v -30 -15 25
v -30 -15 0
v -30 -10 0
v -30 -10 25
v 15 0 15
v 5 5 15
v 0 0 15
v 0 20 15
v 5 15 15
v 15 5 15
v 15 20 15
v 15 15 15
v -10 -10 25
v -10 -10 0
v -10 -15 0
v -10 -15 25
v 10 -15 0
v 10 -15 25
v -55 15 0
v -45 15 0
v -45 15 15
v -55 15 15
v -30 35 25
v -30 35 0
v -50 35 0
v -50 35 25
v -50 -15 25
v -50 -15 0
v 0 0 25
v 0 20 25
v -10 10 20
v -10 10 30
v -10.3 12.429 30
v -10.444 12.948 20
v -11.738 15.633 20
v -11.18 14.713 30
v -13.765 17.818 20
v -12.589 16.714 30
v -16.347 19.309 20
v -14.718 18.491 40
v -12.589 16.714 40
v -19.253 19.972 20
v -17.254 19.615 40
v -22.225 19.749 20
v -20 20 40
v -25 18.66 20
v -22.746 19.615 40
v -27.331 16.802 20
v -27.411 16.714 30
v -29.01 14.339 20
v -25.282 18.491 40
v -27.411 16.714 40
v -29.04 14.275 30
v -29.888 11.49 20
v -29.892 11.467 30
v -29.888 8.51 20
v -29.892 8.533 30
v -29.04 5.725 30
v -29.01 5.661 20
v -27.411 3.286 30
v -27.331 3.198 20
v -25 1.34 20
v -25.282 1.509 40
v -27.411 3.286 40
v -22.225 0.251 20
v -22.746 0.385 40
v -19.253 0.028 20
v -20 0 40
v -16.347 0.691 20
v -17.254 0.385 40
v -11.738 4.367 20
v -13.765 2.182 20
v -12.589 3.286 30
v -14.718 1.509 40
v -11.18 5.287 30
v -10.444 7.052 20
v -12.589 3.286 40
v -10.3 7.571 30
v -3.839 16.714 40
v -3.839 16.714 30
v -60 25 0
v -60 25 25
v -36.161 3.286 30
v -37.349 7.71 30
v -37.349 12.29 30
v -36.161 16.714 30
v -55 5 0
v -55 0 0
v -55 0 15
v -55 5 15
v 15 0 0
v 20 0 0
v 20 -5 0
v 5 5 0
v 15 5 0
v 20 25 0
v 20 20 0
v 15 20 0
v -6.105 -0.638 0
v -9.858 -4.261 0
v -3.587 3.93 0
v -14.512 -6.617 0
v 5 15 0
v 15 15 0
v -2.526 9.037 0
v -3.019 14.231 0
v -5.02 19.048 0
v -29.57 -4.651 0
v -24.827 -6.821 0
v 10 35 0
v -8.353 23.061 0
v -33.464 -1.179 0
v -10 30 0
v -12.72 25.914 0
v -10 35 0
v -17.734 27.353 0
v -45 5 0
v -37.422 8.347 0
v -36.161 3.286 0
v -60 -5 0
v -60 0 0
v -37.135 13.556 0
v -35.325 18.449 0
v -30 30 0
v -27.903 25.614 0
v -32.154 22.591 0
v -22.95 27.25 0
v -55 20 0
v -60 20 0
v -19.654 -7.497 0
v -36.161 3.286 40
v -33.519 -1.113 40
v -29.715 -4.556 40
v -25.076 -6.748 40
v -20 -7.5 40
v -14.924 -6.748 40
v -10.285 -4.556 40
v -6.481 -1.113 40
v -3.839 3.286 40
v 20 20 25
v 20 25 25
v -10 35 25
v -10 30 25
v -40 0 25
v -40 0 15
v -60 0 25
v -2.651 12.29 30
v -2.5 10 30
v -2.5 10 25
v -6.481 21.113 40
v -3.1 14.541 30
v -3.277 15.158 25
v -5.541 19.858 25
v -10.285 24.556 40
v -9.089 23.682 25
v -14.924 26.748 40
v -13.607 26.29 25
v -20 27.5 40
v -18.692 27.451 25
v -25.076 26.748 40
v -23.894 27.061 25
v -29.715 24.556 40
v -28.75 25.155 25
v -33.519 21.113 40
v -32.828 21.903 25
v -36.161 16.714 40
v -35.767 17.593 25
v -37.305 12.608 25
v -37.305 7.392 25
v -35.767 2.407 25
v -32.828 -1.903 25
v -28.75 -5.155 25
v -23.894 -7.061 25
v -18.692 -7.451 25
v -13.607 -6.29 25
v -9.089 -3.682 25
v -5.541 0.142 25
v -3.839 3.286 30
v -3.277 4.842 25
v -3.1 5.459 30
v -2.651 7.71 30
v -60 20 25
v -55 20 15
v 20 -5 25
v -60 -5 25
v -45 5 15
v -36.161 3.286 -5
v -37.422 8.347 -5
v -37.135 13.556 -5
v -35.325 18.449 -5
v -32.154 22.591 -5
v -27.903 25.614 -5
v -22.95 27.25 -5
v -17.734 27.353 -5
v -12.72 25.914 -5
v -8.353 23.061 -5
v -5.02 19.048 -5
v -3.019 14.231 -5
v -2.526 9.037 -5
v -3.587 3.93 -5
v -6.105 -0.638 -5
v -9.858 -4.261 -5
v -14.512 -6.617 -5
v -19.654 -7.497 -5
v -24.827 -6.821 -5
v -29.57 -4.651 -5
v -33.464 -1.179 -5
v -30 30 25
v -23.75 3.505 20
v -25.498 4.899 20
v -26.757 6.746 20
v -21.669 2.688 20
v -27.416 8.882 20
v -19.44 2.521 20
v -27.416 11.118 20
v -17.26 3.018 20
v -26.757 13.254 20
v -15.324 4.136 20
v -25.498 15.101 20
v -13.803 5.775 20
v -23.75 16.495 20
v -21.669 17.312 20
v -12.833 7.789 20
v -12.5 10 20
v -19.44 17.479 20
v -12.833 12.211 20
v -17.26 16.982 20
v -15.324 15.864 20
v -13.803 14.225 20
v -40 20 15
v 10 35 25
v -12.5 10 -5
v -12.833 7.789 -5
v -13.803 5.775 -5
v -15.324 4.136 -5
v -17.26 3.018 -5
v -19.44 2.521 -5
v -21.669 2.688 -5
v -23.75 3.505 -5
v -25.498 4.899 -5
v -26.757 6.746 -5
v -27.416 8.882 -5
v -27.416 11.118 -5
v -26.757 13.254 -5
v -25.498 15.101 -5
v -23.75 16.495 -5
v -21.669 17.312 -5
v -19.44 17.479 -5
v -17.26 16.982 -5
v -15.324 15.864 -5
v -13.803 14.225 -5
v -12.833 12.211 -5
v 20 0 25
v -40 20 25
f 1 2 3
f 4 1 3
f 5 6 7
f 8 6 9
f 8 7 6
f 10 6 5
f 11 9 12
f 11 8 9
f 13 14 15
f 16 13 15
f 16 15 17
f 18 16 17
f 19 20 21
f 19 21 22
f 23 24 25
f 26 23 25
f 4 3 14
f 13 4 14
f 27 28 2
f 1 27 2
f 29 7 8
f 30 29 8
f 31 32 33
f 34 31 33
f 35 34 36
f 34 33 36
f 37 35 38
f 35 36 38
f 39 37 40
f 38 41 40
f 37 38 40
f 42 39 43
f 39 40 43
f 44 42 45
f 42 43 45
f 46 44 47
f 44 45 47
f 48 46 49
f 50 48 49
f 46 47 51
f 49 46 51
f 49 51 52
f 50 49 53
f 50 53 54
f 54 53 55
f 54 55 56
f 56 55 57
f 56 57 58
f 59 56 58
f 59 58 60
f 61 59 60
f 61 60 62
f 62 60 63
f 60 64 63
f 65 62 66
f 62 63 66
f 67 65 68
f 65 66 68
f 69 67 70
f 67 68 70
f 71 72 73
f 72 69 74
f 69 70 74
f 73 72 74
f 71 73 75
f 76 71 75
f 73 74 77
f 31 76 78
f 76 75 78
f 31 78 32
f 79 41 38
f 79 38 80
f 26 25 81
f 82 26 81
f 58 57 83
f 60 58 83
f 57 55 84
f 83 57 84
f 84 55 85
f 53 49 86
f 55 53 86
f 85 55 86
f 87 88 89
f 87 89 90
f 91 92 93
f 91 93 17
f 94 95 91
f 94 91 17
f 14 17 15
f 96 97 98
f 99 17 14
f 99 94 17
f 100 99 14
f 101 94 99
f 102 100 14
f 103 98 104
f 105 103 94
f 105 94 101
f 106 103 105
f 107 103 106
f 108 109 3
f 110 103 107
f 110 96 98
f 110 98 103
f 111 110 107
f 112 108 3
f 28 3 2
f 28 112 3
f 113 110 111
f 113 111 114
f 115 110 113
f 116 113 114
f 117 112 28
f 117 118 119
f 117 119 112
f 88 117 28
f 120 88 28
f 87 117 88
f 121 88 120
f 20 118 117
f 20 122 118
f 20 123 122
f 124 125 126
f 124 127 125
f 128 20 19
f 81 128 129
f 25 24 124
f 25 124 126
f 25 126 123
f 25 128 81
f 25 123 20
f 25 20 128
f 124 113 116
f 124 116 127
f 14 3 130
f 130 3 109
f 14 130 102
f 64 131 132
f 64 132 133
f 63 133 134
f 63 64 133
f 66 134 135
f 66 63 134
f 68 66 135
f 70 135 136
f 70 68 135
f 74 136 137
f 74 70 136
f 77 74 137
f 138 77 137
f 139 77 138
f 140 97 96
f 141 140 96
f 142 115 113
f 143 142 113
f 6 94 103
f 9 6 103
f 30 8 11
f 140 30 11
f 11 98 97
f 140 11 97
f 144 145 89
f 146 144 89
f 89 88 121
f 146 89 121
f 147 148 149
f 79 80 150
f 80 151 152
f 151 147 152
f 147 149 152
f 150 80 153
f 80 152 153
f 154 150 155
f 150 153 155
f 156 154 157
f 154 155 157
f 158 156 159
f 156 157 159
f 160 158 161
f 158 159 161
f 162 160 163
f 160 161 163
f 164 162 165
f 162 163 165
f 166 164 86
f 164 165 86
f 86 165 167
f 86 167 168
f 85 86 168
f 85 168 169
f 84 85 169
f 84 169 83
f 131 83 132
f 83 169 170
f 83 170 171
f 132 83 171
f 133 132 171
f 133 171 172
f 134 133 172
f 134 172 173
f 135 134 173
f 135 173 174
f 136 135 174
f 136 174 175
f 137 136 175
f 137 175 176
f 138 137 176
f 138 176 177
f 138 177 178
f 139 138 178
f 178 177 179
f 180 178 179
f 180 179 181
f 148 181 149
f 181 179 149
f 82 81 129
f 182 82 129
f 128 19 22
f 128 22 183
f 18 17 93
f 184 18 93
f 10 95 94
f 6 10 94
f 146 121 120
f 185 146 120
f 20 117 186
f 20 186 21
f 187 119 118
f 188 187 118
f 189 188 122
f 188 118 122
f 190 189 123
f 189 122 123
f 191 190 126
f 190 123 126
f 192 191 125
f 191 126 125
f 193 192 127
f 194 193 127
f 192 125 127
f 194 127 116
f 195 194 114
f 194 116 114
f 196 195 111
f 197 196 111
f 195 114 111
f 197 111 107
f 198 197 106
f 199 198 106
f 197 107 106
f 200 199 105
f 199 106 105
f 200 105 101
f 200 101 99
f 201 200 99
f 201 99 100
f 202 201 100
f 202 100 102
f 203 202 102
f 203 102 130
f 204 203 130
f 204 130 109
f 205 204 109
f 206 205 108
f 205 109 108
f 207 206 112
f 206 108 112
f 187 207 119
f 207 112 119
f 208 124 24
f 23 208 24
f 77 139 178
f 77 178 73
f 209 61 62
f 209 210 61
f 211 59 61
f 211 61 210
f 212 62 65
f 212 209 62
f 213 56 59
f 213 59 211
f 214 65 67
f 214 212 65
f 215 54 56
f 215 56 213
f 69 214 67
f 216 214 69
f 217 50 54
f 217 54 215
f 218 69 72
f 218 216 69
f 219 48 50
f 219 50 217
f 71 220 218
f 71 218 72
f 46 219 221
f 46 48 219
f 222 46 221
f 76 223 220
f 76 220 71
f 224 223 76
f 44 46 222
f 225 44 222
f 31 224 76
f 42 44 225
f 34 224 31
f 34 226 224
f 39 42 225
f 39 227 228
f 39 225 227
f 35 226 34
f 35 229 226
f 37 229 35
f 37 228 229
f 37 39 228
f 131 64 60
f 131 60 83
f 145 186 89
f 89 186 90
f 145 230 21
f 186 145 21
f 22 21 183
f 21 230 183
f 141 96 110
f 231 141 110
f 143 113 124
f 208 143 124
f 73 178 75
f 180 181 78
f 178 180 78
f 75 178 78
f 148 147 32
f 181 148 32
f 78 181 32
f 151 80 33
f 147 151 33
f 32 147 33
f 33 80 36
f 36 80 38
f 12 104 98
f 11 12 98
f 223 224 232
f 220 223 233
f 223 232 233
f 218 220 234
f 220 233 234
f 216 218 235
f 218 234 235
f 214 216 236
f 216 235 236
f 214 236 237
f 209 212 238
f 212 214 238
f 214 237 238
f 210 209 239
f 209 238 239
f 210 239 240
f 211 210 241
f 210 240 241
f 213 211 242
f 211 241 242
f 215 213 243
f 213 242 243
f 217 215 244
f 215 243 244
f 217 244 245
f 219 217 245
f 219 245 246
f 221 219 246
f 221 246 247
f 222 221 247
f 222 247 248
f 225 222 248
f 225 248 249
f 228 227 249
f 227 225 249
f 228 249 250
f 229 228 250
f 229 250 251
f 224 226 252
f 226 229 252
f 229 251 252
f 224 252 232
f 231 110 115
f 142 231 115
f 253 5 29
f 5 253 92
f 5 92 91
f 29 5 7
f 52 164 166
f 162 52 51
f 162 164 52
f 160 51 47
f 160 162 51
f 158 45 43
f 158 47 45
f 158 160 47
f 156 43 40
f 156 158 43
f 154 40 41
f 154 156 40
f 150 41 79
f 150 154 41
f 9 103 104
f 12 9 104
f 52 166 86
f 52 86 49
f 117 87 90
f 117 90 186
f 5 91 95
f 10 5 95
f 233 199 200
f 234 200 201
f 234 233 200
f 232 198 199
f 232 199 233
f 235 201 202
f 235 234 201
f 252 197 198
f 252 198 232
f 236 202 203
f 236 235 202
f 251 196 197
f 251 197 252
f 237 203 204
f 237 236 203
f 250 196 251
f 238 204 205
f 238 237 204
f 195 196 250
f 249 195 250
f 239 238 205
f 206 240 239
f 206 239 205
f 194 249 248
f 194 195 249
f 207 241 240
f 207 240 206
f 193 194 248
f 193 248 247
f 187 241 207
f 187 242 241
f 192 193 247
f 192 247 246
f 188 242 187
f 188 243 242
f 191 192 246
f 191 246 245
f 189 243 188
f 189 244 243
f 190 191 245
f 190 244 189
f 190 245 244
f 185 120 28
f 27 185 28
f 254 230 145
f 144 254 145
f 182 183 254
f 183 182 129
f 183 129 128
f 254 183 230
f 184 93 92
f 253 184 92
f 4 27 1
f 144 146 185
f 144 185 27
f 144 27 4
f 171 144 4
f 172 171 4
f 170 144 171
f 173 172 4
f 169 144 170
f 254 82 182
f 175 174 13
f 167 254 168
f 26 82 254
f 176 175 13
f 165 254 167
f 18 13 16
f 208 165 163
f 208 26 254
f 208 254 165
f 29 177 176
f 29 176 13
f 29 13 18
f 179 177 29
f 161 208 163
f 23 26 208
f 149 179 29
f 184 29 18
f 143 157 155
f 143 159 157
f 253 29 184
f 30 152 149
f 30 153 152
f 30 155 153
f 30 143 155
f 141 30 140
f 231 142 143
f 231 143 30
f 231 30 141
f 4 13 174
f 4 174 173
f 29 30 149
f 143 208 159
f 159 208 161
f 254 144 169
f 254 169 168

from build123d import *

# Parameters (mm, degrees)
BOSS_EXTRUDE1_DEPTH = 25
BOSS_EXTRUDE5_DEPTH = 15
SKETCH3_R           = 17.5
BOSS_EXTRUDE6_DEPTH = 15
SKETCH4_R           = 10
CUT_EXTRUDE1_DEPTH  = 20
SKETCH5_R           = 7.5
CUT_EXTRUDE2_DEPTH  = 80
CUT_EXTRUDE3_DEPTH  = 10
SKETCH7_R           = 17.5
BOSS_EXTRUDE7_DEPTH = 5
SKETCH8_R           = 7.5
CUT_EXTRUDE4_DEPTH  = 315


with BuildPart() as part:
    # Sketch1 → Boss-Extrude1 (new body)
    with BuildSketch(Plane.XY):
        Polygon((-60, 0), (-60, -5), (-50, -15), (-30, -15), (-30, -10), (-10, -10), (-10, -15), (10, -15), (20, -5), (20, 0), (0, 0), (0, 20), (20, 20), (20, 25), (10, 35), (-10, 35), (-10, 30), (-30, 30), (-30, 35), (-50, 35), (-60, 25), (-60, 20), (-40, 20), (-40, 0), align=None)
    extrude(amount=BOSS_EXTRUDE1_DEPTH)

    # Sketch2 → Boss-Extrude5 (add)
    with BuildSketch(Plane(origin=(0, 0, 0), x_dir=(-1, 0, 0), z_dir=(0, 0, -1))):
        Polygon((55, 20), (40, 20), (40, 0), (55, 0), (55, 5), (45, 5), (45, 15), (55, 15), align=None)
        Polygon((-15, 15), (-15, 20), (0, 20), (0, 0), (-15, 0), (-15, 5), (-5, 5), (-5, 15), align=None)
    extrude(amount=-BOSS_EXTRUDE5_DEPTH)

    # Sketch3 → Boss-Extrude6 (add)
    with BuildSketch(Plane.XY.offset(25)):
        with Locations((-20, 10)):
            Circle(SKETCH3_R)
    extrude(amount=BOSS_EXTRUDE6_DEPTH)

    # Sketch4 → Cut-Extrude1 (cut)
    with BuildSketch(Plane.XY.offset(40)):
        with Locations((-20, 10)):
            Circle(SKETCH4_R)
    extrude(amount=-CUT_EXTRUDE1_DEPTH, mode=Mode.SUBTRACT)

    # Sketch5 → Cut-Extrude2 (cut)
    with BuildSketch(Plane.XY.offset(20)):
        with Locations((-20, 10)):
            Circle(SKETCH5_R)
    extrude(amount=-CUT_EXTRUDE2_DEPTH, mode=Mode.SUBTRACT)

    # Sketch6 → Cut-Extrude3 (cut)
    with BuildSketch(Plane.XY.offset(40)):
        with BuildLine():
            Line((-36.160714286, 16.714261968), (-27.410714286, 16.714261968))
            ThreePointArc((-27.410714286, 16.714261968), (-30, 10), (-27.410714286, 3.285738032))
            Line((-27.410714286, 3.285738032), (-36.160714286, 3.285738032))
            ThreePointArc((-36.160714286, 3.285738032), (-37.5, 10), (-36.160714286, 16.714261968))
        make_face()
        with BuildLine():
            Line((-12.589285714, 16.714261968), (-3.839285714, 16.714261968))
            ThreePointArc((-3.839285714, 16.714261968), (-2.5, 10), (-3.839285714, 3.285738032))
            Line((-3.839285714, 3.285738032), (-12.589285714, 3.285738032))
            ThreePointArc((-12.589285714, 3.285738032), (-10, 10), (-12.589285714, 16.714261968))
        make_face()
    extrude(amount=-CUT_EXTRUDE3_DEPTH, mode=Mode.SUBTRACT)

    # Sketch7 → Boss-Extrude7 (add)
    with BuildSketch(Plane(origin=(0, 0, 0), x_dir=(-1, 0, 0), z_dir=(0, 0, -1))):
        with Locations(Location((20, 10, 0), (0, 0, 337.438671909))):
            Circle(SKETCH7_R)
    extrude(amount=BOSS_EXTRUDE7_DEPTH)

    # Sketch8 → Cut-Extrude4 (cut)
    with BuildSketch(Plane(origin=(0, 0, -5), x_dir=(-1, 0, 0), z_dir=(0, 0, -1))):
        with Locations(Location((20, 10, 0), (0, 0, 180))):
            Circle(SKETCH8_R)
    extrude(amount=-CUT_EXTRUDE4_DEPTH, mode=Mode.SUBTRACT)


solid = part.part
